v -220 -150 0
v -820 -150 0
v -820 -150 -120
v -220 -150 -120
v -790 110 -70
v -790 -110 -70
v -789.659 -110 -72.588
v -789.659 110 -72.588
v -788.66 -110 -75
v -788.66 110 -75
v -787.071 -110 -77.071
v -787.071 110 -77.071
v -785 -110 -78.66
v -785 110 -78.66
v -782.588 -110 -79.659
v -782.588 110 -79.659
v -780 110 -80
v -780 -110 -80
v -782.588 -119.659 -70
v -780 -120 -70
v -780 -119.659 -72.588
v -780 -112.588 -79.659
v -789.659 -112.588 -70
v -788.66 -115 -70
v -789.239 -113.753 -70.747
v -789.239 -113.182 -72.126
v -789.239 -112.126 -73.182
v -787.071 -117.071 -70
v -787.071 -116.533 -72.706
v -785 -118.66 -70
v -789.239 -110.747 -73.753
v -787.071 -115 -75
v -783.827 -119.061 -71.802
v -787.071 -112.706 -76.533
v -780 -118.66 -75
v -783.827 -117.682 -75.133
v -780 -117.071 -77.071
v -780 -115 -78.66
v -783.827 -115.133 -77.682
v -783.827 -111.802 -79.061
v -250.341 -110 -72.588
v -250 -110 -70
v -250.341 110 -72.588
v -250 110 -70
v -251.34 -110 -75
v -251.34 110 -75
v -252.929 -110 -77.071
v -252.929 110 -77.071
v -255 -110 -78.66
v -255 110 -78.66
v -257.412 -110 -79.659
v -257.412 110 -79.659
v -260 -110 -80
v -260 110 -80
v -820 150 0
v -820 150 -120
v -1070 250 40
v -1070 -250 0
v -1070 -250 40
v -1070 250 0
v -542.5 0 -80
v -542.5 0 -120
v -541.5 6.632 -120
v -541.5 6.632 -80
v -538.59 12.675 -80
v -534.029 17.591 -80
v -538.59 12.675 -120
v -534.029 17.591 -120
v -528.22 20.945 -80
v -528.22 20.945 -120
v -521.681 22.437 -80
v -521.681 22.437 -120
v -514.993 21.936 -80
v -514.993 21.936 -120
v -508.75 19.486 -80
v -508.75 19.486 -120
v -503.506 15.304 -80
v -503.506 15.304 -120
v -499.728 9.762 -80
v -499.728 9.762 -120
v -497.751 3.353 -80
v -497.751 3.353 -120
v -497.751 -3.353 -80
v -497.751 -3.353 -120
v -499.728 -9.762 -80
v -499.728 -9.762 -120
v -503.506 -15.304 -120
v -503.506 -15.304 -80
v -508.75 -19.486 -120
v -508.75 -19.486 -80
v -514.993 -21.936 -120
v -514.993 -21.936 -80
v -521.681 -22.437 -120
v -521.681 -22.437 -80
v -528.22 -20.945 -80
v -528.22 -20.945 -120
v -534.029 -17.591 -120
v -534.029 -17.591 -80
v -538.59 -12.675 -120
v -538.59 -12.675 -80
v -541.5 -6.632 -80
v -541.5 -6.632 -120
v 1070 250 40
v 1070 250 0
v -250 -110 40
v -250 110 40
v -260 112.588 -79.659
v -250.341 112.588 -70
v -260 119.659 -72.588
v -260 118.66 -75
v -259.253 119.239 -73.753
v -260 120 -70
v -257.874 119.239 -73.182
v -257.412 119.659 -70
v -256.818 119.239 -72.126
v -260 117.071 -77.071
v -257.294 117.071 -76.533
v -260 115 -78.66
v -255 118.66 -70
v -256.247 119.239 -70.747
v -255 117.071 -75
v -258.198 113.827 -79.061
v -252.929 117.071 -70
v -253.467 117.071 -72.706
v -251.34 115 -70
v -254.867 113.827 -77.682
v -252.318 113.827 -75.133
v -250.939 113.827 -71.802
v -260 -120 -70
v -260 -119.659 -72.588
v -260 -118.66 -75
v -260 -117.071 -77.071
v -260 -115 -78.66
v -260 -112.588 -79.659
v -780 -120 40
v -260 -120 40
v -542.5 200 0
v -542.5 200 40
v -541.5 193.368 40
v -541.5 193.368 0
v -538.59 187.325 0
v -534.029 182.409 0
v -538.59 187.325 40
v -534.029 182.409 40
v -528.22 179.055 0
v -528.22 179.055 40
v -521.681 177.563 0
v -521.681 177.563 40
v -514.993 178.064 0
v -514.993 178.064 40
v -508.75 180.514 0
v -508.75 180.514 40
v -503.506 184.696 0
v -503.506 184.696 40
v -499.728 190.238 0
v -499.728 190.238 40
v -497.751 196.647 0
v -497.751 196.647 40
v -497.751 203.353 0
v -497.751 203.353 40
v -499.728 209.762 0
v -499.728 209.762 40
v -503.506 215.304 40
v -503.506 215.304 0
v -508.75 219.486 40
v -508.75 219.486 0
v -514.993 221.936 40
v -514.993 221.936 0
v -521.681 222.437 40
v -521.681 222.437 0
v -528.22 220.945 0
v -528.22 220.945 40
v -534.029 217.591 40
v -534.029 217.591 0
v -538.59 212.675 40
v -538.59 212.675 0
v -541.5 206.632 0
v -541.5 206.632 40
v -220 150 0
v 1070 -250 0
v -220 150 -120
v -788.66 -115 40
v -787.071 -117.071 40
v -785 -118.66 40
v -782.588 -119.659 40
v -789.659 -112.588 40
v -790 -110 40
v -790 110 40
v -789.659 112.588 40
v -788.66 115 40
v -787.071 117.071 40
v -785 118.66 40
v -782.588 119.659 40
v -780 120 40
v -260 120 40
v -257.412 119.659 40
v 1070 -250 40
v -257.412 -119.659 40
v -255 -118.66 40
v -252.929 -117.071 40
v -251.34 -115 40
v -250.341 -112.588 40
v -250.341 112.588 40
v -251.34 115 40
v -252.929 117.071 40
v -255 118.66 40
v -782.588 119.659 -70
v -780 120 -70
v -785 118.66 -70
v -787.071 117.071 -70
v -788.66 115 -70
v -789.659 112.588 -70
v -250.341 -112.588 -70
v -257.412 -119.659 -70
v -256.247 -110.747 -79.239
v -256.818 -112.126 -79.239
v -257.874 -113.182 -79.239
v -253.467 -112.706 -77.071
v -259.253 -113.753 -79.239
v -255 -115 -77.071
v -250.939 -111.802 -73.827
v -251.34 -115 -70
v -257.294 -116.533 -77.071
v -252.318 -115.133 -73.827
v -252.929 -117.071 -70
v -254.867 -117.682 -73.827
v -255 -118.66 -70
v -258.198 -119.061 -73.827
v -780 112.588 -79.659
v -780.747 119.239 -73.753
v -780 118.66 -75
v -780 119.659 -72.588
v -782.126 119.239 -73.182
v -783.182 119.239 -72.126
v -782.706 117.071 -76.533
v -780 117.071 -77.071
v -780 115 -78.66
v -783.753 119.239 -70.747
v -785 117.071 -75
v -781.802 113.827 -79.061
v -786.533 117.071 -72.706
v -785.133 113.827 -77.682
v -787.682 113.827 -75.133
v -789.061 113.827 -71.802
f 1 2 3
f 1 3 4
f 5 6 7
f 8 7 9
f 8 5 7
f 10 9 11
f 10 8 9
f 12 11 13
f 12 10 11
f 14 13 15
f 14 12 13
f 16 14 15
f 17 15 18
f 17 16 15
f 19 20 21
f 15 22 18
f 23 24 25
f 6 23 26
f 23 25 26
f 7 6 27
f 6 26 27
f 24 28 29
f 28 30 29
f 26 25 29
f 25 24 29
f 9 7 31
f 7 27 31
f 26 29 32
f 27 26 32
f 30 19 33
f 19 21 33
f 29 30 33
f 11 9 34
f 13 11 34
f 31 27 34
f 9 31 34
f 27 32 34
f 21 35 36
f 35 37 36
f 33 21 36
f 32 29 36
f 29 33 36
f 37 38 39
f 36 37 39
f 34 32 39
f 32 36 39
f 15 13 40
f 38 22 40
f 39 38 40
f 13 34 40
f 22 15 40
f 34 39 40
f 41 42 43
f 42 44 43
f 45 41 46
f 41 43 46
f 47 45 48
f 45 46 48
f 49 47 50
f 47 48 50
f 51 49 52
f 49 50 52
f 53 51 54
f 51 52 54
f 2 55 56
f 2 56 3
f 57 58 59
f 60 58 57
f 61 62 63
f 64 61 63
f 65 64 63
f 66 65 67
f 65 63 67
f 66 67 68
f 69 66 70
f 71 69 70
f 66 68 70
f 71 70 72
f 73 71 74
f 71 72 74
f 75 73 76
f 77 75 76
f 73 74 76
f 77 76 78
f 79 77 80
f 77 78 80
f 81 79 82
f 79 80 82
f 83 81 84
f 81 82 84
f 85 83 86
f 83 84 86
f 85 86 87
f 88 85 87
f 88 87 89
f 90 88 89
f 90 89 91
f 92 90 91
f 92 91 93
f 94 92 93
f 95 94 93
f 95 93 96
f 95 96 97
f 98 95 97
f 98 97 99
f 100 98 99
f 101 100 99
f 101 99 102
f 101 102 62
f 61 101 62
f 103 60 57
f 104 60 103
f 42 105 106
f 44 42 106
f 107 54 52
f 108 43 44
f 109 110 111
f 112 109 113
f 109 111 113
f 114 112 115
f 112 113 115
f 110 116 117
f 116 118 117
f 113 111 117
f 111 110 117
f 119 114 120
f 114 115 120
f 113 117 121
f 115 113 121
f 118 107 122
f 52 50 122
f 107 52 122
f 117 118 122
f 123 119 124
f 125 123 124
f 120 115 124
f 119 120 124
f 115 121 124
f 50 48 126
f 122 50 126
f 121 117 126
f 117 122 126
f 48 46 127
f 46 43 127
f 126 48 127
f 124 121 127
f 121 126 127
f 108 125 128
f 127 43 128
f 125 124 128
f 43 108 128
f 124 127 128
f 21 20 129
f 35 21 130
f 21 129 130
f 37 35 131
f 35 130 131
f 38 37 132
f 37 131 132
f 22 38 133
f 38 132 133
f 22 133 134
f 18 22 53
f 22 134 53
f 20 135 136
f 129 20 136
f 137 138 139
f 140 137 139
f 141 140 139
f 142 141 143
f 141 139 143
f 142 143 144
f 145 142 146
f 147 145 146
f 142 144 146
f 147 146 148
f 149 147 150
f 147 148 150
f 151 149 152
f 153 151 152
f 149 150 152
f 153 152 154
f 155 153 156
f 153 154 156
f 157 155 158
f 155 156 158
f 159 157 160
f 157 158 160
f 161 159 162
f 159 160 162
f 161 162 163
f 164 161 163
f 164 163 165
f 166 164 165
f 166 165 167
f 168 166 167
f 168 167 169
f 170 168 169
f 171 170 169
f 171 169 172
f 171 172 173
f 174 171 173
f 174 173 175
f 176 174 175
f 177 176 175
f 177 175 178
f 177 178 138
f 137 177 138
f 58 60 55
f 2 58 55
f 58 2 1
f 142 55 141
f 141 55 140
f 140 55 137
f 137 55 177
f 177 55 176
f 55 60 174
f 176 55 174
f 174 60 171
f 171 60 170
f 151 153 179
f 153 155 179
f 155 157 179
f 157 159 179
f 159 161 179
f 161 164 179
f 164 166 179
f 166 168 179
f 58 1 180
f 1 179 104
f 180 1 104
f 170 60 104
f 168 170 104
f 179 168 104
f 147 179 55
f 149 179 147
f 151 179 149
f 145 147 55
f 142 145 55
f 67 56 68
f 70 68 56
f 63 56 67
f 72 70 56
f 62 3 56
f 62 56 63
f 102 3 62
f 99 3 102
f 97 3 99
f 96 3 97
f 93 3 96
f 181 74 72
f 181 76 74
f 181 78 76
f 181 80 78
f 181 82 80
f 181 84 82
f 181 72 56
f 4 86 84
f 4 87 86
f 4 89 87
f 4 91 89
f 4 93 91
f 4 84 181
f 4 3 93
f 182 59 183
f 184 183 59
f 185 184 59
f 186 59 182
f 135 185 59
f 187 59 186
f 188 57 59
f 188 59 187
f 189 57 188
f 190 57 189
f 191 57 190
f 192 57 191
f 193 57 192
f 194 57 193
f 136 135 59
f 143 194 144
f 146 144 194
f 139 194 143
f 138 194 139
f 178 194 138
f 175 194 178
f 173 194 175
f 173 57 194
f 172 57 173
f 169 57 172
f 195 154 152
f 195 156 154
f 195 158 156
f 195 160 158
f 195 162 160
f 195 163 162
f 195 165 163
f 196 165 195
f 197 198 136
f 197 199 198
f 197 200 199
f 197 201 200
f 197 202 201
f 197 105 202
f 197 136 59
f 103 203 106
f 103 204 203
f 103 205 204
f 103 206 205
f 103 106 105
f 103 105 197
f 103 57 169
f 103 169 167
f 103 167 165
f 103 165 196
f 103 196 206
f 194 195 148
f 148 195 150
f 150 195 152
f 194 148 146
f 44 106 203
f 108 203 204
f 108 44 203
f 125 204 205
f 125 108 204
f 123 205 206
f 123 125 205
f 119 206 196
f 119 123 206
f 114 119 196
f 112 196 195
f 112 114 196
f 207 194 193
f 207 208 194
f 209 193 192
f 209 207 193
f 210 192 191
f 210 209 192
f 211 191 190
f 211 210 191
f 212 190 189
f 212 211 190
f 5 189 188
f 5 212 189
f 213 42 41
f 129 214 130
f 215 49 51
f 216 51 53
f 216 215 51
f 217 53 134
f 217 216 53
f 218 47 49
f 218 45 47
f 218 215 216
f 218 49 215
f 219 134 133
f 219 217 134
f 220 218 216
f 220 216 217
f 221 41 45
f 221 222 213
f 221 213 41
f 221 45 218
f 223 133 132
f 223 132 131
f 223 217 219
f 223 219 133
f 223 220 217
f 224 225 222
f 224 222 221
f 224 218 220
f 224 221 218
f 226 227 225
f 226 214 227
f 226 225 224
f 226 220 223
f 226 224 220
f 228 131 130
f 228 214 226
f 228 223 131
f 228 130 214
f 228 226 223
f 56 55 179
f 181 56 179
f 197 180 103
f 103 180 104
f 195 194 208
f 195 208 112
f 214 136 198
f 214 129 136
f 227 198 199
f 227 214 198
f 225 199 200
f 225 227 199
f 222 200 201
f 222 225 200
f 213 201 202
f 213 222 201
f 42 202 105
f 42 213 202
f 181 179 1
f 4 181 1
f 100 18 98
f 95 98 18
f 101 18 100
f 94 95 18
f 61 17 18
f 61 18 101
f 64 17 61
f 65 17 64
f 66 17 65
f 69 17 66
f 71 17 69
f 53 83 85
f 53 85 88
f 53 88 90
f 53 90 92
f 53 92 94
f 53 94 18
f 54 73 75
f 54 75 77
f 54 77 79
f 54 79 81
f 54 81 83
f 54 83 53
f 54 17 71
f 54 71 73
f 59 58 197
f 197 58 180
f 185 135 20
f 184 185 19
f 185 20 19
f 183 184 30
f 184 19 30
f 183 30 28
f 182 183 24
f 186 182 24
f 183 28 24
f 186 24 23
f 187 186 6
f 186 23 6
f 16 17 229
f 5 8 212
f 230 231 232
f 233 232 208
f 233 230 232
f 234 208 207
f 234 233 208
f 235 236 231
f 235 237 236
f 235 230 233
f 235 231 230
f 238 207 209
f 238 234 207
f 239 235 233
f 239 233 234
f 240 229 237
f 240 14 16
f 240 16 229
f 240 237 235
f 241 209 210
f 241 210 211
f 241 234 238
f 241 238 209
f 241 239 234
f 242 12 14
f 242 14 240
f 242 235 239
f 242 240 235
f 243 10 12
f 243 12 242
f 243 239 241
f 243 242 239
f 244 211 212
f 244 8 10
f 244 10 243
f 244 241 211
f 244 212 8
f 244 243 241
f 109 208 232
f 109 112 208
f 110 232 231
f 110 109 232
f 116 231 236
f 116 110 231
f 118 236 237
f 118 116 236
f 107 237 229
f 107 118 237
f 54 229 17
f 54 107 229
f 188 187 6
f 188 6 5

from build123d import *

# Parameters (mm, degrees)
F0_W     = 2140
F0_H     = 500
F1_DEPTH = 40
F2_W     = 600
F2_H     = 300
F3_DEPTH = 120
F5_D     = 45
F6_W     = 540
F6_H     = 240
F7_DEPTH = 120
F8_R     = 10
F10_D    = 45


with BuildPart() as f1:
    # F0 (on Top) → F1 (new body)
    with BuildSketch(Plane.XY):
        Rectangle(F0_W, F0_H)
    extrude(amount=F1_DEPTH)

    # F2 (on face) → F3 (join)
    with BuildSketch(Plane(origin=(0, 0, 0), x_dir=(1, 0, 0), z_dir=(0, 0, -1))):
        with Locations((-520, 0)):
            Rectangle(F2_W, F2_H)
    extrude(amount=F3_DEPTH)

    # F5 (through all)
    with Locations(Plane(origin=(0, 0, 0), x_dir=(1, 0, 0), z_dir=(0, 0, -1))):
        with Locations((-520, -200)):
            Hole(F5_D / 2)

    # F6 (on face) → F7 (cut)
    with BuildSketch(Plane.XY.offset(40)):
        with Locations((-520, 0)):
            Rectangle(F6_W, F6_H)
    extrude(amount=-F7_DEPTH, mode=Mode.SUBTRACT)

    # F8
    f8_edges = [f1.edges().sort_by_distance(p)[0] for p in [
        (-250, -120, -20),
        (-250, 0, -80),
        (-520, -120, -80),
        (-790, -120, -20),
        (-790, 0, -80),
        (-520, 120, -80),
        (-250, 120, -20),
        (-790, 120, -20),
    ]]
    fillet(f8_edges, radius=F8_R)

    # F10 (through all)
    with Locations(Plane.XY.offset(-80)):
        with Locations((-520, 0)):
            Hole(F10_D / 2)


solid = f1.part
